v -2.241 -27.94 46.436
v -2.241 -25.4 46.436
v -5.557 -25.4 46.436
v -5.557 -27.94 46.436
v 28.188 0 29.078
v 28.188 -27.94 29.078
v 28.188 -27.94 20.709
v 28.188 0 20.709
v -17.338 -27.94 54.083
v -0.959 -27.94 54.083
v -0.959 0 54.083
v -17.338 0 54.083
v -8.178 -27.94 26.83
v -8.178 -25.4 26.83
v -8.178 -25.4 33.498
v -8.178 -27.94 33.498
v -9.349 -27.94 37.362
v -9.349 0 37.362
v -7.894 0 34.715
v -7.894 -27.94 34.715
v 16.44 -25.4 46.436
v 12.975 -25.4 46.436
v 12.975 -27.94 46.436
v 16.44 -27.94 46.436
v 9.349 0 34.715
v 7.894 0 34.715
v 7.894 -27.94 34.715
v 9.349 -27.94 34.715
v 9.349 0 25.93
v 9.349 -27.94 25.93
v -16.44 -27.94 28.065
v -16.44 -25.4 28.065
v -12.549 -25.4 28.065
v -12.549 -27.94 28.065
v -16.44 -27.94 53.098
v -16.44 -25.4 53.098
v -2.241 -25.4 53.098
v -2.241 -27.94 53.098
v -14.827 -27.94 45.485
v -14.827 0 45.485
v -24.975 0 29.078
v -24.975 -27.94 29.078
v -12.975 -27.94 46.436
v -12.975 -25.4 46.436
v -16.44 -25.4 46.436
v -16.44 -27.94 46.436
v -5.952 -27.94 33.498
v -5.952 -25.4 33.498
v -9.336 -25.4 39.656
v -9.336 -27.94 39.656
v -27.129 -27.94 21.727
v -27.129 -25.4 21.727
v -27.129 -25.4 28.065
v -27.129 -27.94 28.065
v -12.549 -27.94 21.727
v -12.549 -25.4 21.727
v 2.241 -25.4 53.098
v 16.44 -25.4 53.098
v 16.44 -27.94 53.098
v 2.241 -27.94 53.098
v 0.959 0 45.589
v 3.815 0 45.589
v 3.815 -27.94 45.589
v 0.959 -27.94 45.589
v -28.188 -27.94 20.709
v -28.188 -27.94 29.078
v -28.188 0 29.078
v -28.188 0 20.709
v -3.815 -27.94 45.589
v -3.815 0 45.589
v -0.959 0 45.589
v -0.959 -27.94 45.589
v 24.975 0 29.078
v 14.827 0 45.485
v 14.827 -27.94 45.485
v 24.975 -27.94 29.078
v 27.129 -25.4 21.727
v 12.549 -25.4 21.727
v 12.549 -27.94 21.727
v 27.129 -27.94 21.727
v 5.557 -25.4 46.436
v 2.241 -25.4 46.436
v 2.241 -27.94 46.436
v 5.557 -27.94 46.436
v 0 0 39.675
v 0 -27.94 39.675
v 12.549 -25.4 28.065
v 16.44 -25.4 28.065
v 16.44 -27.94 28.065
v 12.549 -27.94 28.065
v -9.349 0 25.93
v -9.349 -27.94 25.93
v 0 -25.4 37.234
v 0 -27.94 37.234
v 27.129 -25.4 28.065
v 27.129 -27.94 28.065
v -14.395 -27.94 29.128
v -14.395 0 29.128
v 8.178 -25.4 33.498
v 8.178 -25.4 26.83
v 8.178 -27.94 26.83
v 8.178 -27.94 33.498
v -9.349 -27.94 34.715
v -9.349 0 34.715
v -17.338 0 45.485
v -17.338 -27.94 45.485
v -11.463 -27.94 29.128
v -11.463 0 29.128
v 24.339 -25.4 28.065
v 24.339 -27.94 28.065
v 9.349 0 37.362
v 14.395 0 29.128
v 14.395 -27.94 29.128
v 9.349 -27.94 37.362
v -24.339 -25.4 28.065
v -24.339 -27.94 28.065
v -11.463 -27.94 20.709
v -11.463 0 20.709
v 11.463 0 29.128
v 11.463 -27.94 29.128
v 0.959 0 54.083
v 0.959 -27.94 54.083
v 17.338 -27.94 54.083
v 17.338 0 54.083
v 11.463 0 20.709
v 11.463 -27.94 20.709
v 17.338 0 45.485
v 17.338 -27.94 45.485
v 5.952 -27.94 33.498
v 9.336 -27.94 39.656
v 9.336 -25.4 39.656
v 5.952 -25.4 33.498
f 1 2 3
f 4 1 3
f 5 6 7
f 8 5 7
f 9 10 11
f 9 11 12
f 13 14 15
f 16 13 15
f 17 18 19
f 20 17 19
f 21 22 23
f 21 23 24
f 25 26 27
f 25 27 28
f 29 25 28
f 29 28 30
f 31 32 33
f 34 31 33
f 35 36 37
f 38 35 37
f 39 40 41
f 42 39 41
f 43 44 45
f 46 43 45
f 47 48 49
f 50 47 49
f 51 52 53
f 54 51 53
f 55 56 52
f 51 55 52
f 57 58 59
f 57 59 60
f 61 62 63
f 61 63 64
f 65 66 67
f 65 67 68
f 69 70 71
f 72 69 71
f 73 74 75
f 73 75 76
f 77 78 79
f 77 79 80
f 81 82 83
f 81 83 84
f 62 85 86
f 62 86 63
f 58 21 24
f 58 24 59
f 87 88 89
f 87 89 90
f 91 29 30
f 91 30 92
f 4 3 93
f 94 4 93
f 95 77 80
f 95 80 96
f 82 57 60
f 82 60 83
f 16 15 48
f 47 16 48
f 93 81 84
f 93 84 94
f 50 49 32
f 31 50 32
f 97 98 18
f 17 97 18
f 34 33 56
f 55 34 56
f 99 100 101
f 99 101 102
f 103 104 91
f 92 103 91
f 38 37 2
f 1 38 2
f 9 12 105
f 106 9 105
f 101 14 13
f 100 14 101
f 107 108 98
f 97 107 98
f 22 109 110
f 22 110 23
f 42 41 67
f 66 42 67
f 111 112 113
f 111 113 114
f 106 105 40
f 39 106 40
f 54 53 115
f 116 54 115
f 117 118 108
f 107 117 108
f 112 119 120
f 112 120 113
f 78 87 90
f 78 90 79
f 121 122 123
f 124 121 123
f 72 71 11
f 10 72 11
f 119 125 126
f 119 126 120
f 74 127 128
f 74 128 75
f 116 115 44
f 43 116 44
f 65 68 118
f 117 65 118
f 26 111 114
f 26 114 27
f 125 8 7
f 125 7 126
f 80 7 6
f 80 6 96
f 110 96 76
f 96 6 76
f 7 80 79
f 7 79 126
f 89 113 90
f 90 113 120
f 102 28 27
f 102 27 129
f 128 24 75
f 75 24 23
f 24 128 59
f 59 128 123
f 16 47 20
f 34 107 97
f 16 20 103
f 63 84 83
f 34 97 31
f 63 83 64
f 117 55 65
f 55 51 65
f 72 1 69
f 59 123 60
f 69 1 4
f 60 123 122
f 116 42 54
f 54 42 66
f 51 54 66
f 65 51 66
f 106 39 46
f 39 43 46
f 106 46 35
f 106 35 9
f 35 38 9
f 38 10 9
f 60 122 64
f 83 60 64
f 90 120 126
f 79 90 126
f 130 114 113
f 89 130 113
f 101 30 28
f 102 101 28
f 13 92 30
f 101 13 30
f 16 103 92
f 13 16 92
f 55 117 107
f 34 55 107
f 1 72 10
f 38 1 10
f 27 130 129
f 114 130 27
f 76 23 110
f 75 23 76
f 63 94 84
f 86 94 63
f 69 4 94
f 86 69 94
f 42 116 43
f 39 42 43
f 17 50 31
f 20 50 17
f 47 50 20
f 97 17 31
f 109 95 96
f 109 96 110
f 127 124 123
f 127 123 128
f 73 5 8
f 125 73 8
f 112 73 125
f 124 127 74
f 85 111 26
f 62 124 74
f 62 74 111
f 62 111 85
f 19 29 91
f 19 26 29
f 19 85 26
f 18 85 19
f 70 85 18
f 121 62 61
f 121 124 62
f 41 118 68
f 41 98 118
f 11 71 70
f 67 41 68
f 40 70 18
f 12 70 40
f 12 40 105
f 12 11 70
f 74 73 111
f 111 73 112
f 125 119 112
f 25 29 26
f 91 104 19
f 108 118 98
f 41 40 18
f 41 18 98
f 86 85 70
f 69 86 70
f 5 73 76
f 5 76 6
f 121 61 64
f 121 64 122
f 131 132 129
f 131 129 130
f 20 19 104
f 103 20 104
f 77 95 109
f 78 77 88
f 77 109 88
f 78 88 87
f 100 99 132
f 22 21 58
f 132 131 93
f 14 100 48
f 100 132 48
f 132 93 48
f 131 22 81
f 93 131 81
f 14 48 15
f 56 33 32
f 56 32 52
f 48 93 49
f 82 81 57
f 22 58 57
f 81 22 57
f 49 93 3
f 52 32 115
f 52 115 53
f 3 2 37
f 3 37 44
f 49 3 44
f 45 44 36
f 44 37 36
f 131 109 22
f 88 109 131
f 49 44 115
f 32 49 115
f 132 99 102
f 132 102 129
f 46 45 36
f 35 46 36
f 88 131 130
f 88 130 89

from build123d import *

# Parameters (mm, degrees)
F1_DEPTH = 25.4
F2_DEPTH = 27.94


with BuildPart() as f1:
    # F0 (on Front) → F1 (new body)
    with BuildSketch(Plane.XZ):
        Polygon((0, 26.830262), (0, 37.234288), (-5.556555, 46.435609), (-2.240721, 46.435609), (-2.240721, 53.097513), (-16.439889, 53.097513), (-16.439889, 46.435609), (-12.975313, 46.435609), (-24.338637, 28.06516), (-27.128741, 28.06516), (-27.128741, 21.727359), (-12.54946, 21.727359), (-12.54946, 28.06516), (-16.439889, 28.06516), (-9.336166, 39.656349), (-5.951528, 33.498235), (-8.177853, 33.498235), (-8.177853, 26.830262), align=None)
    extrude(amount=F1_DEPTH)

    # F0 (on Front) → F2 (join)
    with BuildSketch(Plane.XZ):
        Polygon((0, 37.234288), (0, 39.675493), (-3.814953, 45.588929), (-0.95885, 45.588929), (-0.95885, 54.082506), (-17.337842, 54.082506), (-17.337842, 45.48464), (-14.827147, 45.48464), (-24.975492, 29.078379), (-28.187823, 29.078379), (-28.187823, 20.709392), (-11.463354, 20.709392), (-11.463354, 29.128009), (-14.395286, 29.128009), (-9.349254, 37.361652), (-7.894423, 34.714688), (-9.349254, 34.714688), (-9.349254, 25.930258), (0, 25.930258), (0, 26.830262), (-8.177853, 26.830262), (-8.177853, 33.498235), (-5.951528, 33.498235), (-9.336166, 39.656349), (-16.439889, 28.06516), (-12.54946, 28.06516), (-12.54946, 21.727359), (-27.128741, 21.727359), (-27.128741, 28.06516), (-24.338637, 28.06516), (-12.975313, 46.435609), (-16.439889, 46.435609), (-16.439889, 53.097513), (-2.240721, 53.097513), (-2.240721, 46.435609), (-5.556555, 46.435609), align=None)
    extrude(amount=F2_DEPTH)

    # F3: F1 across face


with BuildPart() as f1_1:
    add(f1.part)
    add(f1.part.mirror(Plane(origin=(0, -13.031526, 32.859819), x_dir=(0, 1, 0), z_dir=(1, 0, 0))))


solid = f1_1.part
